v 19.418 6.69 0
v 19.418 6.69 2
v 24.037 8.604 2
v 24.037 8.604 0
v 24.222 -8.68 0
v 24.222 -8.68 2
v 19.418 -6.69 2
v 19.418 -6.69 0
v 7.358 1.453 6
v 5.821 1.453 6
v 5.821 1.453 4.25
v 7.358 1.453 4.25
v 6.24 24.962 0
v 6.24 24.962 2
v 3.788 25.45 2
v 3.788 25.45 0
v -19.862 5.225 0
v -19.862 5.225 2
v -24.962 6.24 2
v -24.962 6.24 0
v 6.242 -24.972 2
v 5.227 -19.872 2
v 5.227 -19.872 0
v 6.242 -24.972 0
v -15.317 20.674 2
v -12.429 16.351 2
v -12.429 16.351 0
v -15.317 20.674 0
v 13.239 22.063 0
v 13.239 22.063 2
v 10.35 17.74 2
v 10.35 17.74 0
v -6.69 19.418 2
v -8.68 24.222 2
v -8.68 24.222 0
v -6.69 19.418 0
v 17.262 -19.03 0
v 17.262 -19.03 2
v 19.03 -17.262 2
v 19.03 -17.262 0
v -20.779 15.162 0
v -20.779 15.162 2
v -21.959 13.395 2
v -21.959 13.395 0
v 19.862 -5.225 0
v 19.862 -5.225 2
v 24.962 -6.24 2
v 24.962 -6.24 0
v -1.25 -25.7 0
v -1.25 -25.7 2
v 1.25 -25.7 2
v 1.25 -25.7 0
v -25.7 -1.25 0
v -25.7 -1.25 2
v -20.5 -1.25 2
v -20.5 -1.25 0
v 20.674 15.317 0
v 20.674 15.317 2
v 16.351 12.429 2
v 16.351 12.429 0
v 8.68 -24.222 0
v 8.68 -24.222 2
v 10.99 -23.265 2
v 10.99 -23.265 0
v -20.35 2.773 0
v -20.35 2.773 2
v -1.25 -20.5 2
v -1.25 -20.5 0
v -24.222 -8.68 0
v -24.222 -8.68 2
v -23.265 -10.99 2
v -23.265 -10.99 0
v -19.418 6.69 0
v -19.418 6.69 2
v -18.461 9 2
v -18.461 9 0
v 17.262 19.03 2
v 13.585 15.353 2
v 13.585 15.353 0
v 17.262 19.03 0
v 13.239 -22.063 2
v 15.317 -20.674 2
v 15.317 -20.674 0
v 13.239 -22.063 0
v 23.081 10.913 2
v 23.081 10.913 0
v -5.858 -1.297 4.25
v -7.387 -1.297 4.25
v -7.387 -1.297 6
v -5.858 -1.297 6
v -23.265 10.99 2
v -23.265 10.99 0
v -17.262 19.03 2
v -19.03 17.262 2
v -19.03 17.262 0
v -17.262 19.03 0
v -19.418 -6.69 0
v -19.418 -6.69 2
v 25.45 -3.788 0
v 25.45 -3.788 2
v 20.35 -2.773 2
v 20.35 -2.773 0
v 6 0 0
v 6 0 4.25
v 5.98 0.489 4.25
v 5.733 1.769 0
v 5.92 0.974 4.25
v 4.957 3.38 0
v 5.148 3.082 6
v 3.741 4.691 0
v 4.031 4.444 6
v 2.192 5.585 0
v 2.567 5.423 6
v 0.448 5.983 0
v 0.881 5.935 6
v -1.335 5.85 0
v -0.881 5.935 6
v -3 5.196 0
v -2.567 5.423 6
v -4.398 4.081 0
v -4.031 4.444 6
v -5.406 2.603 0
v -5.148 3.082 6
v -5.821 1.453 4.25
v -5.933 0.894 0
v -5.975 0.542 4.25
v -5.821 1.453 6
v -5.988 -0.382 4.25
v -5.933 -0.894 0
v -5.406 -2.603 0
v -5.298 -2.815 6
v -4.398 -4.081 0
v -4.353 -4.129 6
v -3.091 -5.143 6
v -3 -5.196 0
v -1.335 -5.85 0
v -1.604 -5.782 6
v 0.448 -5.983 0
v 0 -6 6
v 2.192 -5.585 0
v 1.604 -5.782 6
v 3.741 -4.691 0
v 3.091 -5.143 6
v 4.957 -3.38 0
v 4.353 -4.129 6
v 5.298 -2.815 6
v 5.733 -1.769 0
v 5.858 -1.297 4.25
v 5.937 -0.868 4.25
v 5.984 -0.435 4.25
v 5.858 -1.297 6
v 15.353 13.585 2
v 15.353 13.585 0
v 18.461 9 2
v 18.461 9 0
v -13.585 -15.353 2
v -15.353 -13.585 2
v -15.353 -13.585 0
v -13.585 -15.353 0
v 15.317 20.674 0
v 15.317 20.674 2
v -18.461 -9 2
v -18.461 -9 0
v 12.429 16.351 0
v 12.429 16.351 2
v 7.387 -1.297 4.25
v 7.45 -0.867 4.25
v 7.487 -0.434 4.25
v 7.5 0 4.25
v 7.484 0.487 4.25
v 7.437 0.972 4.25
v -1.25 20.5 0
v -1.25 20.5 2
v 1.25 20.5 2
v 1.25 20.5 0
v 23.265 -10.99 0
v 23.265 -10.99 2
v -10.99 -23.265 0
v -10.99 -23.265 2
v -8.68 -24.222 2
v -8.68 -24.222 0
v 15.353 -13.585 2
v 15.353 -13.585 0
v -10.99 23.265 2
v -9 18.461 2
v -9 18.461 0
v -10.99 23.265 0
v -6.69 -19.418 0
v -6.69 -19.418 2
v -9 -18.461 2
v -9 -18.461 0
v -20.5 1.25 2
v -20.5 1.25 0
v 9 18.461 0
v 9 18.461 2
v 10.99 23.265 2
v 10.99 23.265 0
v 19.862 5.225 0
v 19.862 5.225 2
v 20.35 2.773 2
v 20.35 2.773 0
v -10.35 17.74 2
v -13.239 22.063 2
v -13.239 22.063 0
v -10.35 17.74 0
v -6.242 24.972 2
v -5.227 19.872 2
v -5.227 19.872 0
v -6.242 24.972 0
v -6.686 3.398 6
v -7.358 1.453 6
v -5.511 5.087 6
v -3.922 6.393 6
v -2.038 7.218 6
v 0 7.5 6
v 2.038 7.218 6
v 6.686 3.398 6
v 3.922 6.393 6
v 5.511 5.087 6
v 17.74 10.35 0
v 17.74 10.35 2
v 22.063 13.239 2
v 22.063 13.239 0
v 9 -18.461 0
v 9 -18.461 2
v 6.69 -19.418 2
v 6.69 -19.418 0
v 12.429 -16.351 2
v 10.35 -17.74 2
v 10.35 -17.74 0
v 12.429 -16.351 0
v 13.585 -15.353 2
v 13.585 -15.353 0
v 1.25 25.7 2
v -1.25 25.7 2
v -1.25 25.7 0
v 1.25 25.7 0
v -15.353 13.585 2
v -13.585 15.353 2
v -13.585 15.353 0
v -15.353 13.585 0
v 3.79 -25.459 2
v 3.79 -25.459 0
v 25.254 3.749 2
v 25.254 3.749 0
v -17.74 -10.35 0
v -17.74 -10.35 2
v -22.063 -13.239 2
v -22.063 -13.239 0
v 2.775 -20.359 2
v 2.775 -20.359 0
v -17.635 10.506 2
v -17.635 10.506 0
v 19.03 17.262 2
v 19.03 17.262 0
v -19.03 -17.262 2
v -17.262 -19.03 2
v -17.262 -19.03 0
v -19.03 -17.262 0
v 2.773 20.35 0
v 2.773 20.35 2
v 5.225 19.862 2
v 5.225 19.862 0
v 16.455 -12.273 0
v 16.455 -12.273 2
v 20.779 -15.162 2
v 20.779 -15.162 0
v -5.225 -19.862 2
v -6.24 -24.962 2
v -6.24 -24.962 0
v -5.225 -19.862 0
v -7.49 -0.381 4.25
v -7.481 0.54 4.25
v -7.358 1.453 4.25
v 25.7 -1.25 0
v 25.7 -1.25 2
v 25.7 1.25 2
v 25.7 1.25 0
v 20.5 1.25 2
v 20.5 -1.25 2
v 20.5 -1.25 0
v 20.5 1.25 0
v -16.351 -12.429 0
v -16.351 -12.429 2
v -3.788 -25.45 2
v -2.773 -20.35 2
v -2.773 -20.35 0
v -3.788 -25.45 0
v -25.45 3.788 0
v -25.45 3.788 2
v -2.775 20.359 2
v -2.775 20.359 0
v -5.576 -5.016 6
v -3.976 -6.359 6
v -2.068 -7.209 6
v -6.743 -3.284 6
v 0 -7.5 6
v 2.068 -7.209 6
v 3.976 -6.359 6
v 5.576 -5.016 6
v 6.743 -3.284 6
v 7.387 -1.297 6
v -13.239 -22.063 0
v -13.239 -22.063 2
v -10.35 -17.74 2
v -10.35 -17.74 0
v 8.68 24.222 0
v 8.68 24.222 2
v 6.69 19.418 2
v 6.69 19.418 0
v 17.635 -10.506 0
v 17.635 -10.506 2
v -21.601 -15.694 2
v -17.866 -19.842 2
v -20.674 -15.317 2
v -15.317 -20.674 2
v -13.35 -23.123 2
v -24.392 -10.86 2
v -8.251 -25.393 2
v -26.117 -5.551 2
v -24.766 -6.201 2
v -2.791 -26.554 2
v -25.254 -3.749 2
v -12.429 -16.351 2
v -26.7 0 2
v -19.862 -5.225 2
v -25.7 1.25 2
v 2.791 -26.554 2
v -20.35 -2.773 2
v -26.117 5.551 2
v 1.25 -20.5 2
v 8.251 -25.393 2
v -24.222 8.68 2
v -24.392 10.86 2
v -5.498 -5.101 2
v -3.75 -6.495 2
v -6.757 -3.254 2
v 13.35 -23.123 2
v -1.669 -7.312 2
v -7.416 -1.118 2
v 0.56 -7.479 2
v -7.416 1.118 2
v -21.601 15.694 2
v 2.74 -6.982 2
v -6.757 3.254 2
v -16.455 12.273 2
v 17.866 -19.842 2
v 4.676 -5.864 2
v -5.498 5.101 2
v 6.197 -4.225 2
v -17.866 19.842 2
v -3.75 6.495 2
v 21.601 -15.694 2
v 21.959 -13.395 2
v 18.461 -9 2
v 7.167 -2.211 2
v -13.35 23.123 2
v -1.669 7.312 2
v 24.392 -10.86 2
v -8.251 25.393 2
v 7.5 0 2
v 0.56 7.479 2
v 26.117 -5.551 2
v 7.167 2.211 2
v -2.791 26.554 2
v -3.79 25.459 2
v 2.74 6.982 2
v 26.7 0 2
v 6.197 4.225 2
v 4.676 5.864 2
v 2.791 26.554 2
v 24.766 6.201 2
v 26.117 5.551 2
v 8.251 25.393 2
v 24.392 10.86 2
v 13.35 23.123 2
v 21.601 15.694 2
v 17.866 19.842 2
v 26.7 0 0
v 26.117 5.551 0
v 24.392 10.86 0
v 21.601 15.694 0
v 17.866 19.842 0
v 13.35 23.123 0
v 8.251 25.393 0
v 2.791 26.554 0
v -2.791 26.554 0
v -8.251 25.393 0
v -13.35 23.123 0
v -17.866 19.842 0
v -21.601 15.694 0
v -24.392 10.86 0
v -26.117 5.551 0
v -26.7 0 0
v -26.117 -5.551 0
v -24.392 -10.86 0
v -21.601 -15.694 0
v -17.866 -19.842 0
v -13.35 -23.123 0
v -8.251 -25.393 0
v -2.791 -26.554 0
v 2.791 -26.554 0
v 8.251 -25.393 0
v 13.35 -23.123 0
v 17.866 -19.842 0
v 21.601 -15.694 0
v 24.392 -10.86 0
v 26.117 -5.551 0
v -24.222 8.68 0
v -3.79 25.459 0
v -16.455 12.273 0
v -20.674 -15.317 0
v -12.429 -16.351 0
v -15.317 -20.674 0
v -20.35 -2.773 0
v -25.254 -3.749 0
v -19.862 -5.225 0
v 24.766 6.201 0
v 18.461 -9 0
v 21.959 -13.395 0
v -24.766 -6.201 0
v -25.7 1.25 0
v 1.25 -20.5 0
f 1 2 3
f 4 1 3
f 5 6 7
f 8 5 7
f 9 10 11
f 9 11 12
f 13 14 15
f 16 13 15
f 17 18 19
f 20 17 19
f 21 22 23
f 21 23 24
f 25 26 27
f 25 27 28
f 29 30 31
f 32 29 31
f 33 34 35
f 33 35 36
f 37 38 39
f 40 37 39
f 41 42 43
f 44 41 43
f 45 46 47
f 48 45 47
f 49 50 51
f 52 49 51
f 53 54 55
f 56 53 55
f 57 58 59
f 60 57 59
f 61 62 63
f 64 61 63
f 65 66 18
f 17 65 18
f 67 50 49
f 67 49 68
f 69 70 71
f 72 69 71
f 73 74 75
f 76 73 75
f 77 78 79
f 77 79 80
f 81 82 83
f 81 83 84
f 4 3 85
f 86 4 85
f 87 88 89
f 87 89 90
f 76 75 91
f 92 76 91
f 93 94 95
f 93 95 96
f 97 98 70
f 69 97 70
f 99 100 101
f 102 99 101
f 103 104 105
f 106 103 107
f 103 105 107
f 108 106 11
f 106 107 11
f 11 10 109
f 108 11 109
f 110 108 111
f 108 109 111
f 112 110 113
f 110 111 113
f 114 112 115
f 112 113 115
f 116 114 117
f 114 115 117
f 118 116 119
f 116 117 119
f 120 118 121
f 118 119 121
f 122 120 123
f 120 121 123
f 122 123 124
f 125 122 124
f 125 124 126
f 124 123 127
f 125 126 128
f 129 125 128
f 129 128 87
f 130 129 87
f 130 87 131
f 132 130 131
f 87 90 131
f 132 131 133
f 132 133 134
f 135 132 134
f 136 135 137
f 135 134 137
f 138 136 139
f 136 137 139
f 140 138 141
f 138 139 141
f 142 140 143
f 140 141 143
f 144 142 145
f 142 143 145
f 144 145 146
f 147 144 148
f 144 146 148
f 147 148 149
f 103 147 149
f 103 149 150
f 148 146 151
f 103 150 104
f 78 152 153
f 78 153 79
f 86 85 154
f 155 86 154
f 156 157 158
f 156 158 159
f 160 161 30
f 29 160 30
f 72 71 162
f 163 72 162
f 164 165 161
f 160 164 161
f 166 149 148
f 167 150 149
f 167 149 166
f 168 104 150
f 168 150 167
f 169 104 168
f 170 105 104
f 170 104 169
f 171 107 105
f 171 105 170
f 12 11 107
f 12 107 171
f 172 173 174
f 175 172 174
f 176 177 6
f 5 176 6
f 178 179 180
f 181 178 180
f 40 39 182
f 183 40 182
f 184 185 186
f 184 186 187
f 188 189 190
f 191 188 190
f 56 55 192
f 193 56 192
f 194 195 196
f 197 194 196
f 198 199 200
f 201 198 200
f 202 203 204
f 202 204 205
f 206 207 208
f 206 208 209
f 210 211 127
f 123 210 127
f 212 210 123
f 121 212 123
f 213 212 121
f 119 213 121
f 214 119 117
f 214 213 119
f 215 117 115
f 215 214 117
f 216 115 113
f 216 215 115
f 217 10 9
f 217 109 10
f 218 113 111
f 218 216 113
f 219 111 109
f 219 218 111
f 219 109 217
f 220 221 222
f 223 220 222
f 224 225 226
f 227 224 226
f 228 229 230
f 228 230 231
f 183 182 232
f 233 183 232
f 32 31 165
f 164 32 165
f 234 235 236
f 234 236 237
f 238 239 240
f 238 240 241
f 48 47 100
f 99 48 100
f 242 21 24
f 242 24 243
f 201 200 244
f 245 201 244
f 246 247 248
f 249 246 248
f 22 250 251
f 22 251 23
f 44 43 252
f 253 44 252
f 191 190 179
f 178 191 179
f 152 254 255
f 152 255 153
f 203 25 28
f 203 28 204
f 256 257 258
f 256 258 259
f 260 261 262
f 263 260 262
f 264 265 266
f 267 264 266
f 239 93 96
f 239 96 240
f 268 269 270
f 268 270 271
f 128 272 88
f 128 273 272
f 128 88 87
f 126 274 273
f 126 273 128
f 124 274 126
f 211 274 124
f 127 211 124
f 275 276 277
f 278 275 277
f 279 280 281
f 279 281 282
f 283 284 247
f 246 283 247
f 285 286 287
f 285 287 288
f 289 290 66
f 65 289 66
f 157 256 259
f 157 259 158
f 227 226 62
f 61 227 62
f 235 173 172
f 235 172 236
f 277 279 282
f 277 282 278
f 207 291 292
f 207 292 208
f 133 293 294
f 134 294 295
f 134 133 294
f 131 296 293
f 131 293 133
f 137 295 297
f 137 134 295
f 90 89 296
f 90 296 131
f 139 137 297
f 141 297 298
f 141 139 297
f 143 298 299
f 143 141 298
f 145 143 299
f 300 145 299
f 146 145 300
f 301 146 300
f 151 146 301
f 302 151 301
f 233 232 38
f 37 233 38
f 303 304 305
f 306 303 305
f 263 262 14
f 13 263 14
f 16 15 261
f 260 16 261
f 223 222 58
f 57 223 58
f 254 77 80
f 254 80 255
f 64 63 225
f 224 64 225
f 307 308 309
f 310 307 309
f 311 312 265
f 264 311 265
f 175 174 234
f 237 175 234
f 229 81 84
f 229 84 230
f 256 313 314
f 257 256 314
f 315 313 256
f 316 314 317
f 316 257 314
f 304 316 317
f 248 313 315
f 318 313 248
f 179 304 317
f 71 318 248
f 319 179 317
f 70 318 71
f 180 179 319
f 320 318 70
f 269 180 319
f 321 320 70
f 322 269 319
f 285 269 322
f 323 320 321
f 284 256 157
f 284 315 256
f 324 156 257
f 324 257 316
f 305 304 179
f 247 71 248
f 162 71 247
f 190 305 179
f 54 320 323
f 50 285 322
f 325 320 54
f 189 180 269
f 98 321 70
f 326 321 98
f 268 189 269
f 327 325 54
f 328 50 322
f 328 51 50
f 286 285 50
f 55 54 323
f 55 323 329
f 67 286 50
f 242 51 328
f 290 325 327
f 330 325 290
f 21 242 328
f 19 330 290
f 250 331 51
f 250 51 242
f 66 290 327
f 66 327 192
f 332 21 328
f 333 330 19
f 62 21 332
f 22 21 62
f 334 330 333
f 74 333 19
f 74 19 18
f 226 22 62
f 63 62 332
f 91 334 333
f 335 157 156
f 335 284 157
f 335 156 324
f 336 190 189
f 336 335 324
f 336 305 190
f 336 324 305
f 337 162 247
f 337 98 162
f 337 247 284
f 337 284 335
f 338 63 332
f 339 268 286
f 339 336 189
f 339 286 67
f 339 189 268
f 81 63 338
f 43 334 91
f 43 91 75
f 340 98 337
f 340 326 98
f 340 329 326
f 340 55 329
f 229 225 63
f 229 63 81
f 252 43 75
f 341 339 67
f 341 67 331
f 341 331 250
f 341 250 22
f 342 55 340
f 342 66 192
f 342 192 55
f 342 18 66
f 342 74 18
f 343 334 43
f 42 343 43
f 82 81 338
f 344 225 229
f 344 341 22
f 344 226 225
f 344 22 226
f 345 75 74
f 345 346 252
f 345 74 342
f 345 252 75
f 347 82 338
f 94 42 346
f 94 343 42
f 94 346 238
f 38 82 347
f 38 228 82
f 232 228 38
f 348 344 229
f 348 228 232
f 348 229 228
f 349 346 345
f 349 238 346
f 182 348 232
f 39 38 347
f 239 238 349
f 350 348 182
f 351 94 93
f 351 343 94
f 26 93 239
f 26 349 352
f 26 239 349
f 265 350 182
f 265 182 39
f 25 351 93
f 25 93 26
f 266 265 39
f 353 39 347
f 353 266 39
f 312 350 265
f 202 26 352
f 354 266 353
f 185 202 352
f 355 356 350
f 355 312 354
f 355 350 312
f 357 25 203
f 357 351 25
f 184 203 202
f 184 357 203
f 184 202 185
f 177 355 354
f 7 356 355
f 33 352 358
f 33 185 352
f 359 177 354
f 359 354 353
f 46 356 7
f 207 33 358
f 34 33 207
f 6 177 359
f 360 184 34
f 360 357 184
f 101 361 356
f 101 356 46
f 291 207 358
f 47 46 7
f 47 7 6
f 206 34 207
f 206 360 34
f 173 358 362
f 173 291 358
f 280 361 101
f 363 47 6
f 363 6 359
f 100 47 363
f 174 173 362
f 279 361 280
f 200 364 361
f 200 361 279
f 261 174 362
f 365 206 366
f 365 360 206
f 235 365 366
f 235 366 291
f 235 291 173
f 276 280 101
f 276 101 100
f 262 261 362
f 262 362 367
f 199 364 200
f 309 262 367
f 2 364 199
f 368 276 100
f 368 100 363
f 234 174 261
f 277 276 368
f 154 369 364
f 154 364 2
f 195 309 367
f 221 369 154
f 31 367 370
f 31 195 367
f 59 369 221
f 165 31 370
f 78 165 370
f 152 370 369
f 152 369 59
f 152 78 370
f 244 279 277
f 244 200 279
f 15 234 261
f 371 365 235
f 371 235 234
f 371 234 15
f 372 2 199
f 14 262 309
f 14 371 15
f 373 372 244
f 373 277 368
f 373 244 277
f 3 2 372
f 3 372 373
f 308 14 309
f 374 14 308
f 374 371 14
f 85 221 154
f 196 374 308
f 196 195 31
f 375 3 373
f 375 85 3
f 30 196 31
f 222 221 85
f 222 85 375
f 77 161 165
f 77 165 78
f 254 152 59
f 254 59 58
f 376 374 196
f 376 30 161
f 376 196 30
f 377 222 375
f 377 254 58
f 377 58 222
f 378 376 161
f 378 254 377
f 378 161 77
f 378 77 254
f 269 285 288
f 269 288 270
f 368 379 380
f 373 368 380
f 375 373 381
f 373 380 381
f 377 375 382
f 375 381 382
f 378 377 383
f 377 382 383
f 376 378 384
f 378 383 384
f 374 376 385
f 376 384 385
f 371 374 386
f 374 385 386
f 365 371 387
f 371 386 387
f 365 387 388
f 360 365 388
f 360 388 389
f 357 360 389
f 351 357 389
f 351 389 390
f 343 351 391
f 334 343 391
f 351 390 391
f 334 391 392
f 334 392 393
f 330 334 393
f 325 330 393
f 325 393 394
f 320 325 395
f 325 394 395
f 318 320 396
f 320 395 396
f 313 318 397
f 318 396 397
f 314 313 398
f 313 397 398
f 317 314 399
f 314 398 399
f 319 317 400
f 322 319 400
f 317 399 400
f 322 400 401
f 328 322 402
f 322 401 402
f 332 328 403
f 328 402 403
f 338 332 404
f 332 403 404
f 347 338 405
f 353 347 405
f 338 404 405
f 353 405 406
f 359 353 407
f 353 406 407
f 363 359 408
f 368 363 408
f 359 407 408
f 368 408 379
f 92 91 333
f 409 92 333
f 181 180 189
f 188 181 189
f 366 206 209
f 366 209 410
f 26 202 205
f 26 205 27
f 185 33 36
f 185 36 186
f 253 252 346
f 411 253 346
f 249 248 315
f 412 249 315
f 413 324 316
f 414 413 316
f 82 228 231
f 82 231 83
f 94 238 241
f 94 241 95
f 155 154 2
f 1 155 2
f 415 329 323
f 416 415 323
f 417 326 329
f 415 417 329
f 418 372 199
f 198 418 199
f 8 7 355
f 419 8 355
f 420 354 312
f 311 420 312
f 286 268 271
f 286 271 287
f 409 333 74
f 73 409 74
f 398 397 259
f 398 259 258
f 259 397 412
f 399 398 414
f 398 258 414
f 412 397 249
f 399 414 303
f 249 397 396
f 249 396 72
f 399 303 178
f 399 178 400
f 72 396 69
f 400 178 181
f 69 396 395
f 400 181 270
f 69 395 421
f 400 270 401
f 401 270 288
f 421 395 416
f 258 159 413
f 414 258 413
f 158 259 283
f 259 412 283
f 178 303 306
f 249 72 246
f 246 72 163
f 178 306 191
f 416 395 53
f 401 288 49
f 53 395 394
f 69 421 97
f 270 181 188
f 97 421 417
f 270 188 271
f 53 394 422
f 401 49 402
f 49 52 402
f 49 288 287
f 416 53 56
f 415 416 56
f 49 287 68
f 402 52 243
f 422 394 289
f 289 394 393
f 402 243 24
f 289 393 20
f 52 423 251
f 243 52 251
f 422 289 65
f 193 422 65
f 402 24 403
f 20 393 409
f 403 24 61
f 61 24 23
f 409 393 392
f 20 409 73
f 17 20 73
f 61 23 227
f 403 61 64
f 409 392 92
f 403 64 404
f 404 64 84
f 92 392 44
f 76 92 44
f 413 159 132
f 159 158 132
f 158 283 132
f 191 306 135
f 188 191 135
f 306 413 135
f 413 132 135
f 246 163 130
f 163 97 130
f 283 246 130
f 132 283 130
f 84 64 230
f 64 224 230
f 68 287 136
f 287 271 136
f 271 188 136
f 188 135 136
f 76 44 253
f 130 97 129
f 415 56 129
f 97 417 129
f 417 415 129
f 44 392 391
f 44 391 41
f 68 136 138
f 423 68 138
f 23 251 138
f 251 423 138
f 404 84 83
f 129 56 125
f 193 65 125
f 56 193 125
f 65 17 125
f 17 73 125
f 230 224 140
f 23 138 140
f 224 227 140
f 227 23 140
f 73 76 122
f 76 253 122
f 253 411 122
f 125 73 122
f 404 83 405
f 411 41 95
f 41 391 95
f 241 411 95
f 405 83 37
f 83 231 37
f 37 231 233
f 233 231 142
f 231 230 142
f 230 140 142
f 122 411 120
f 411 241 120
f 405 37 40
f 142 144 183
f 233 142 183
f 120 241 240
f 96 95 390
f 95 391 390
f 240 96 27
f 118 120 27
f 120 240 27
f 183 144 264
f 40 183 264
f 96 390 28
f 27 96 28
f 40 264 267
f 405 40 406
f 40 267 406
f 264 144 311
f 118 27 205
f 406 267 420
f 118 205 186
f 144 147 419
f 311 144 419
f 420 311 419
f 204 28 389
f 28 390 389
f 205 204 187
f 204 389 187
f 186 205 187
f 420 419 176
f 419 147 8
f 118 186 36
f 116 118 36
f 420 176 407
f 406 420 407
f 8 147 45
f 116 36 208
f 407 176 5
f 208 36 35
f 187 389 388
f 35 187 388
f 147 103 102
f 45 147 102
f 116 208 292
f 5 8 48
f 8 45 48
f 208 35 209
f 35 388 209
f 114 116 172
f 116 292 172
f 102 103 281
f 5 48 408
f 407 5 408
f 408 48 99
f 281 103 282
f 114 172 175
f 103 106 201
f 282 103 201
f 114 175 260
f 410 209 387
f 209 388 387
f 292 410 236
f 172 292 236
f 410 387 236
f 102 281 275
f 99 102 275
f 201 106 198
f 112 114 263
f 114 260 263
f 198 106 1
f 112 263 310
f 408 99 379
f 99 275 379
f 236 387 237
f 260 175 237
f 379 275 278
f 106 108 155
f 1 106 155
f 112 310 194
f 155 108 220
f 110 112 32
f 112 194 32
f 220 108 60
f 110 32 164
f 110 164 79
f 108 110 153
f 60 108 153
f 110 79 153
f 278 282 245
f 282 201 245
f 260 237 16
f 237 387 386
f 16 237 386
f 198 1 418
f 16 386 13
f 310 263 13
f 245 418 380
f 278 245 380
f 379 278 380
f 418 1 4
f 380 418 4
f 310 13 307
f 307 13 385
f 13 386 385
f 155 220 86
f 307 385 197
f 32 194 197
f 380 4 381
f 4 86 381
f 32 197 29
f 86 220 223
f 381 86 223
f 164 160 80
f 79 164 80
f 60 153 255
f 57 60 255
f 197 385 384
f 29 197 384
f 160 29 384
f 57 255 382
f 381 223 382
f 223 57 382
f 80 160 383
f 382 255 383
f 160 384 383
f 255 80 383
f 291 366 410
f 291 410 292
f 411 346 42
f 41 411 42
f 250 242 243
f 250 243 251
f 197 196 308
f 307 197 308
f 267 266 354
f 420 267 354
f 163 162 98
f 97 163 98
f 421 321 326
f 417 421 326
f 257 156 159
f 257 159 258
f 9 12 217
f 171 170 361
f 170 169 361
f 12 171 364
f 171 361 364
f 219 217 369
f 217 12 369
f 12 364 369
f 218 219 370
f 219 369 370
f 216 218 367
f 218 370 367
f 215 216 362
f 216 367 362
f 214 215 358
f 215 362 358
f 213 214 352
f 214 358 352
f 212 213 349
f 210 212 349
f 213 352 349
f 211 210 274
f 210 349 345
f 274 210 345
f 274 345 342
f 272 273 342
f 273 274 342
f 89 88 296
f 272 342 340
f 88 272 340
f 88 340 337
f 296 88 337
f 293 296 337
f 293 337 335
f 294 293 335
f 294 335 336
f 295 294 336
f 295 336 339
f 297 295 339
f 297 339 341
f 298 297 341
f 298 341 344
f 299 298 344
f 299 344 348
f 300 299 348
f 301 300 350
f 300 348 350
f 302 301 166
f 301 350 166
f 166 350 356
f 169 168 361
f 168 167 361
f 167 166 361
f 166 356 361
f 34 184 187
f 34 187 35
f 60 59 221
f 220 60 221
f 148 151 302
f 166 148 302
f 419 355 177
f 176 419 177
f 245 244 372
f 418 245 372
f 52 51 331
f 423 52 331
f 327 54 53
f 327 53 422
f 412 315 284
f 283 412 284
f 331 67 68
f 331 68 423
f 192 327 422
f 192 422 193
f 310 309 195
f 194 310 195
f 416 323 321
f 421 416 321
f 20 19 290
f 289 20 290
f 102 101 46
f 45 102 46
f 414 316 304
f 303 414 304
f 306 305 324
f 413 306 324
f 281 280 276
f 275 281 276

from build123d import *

# Parameters (mm, degrees)
SKETCH_R        = 26.7
PAD_DEPTH       = 2
SKETCH001_W     = 5.2
SKETCH001_H     = 2.5
SKETCH001_W_2   = 2.5
SKETCH001_H_2   = 5.2
POCKET_DEPTH    = 2.001
SKETCH002_R     = 7.5
PAD001_DEPTH    = 4
SKETCH003_R     = 6
POCKET001_DEPTH = 6.001
SKETCH004_W     = 18.225545
SKETCH004_H     = 2.75
POCKET002_DEPTH = 1.75


with BuildPart() as part:
    # Sketch → Pad (new body)
    with BuildSketch(Plane.XY):
        Circle(SKETCH_R)
    extrude(amount=PAD_DEPTH)

    # Sketch001 → Pocket (cut, through all)
    with BuildSketch(Plane.XY.offset(2)):
        with Locations((-23.1, 0)):
            Rectangle(SKETCH001_W, SKETCH001_H)
        with Locations((23.1, 0)):
            Rectangle(SKETCH001_W, SKETCH001_H)
        with Locations((0, 23.1)):
            Rectangle(SKETCH001_W_2, SKETCH001_H_2)
        with Locations((0, -23.1)):
            Rectangle(SKETCH001_W_2, SKETCH001_H_2)
        Polygon((-19.029555, 17.261788), (-17.261788, 19.029555), (-13.584833, 15.3526), (-15.3526, 13.584833), align=None)
        Polygon((17.261788, 19.029555), (19.029555, 17.261788), (15.3526, 13.584833), (13.584833, 15.3526), align=None)
        Polygon((17.261788, -19.029555), (19.029555, -17.261788), (15.3526, -13.584833), (13.584833, -15.3526), align=None)
        Polygon((-17.261788, -19.029555), (-19.029555, -17.261788), (-15.3526, -13.584833), (-13.584833, -15.3526), align=None)
        Polygon((8.680115, 24.222058), (6.690161, 19.417885), (8.99986, 18.461176), (10.989814, 23.26535), align=None)
        Polygon((18.461176, 8.99986), (19.417885, 6.690161), (24.037282, 8.603578), (23.080574, 10.913277), align=None)
        Polygon((-23.26535, 10.989814), (-24.222058, 8.680115), (-19.417885, 6.690161), (-18.461176, 8.99986), align=None)
        Polygon((-24.222058, -8.680115), (-23.26535, -10.989814), (-18.461176, -8.99986), (-19.417885, -6.690161), align=None)
        Polygon((-10.989814, -23.26535), (-8.680115, -24.222058), (-6.690161, -19.417885), (-8.99986, -18.461176), align=None)
        Polygon((6.690161, -19.417885), (8.680115, -24.222058), (10.989814, -23.26535), (8.99986, -18.461176), align=None)
        Polygon((19.417885, -6.690161), (18.461176, -8.99986), (23.26535, -10.989814), (24.222058, -8.680115), align=None)
        Polygon((-10.989814, 23.26535), (-8.680115, 24.222058), (-6.690161, 19.417885), (-8.99986, 18.461176), align=None)
        Polygon((19.862235, 5.225333), (20.349961, 2.77337), (25.253888, 3.748822), (24.766162, 6.200785), align=None)
        Polygon((-25.253888, -3.748822), (-24.766162, -6.200785), (-19.862235, -5.225333), (-20.349961, -2.77337), align=None)
        Polygon((-24.962319, 6.239803), (-25.450045, 3.78784), (-20.349961, 2.77337), (-19.862235, 5.225333), align=None)
        Polygon((-20.778522, 15.161523), (-21.959016, 13.394787), (-17.635375, 10.505822), (-16.45488, 12.272558), align=None)
        Polygon((-15.317492, 20.674306), (-13.238818, 22.063232), (-10.349853, 17.73959), (-12.428527, 16.350664), align=None)
        Polygon((-6.241651, 24.971611), (-3.789688, 25.459337), (-2.775218, 20.359254), (-5.227182, 19.871528), align=None)
        Polygon((3.78784, 25.450045), (2.77337, 20.349961), (5.225333, 19.862235), (6.239803, 24.962319), align=None)
        Polygon((13.238818, 22.063232), (10.349853, 17.73959), (12.428527, 16.350664), (15.317492, 20.674306), align=None)
        Polygon((16.350664, 12.428527), (17.73959, 10.349853), (22.063232, 13.238818), (20.674306, 15.317492), align=None)
        Polygon((20.349961, -2.77337), (19.862235, -5.225333), (24.962319, -6.239803), (25.450045, -3.78784), align=None)
        Polygon((17.635375, -10.505822), (16.45488, -12.272558), (20.778522, -15.161523), (21.959016, -13.394787), align=None)
        Polygon((10.349853, -17.73959), (12.428527, -16.350664), (15.317492, -20.674306), (13.238818, -22.063232), align=None)
        Polygon((2.775218, -20.359254), (5.227182, -19.871528), (6.241651, -24.971611), (3.789688, -25.459337), align=None)
        Polygon((-2.77337, -20.349961), (-3.78784, -25.450045), (-6.239803, -24.962319), (-5.225333, -19.862235), align=None)
        Polygon((-15.317492, -20.674306), (-13.238818, -22.063232), (-10.349853, -17.73959), (-12.428527, -16.350664), align=None)
        Polygon((-22.063232, -13.238818), (-20.674306, -15.317492), (-16.350664, -12.428527), (-17.73959, -10.349853), align=None)
    extrude(amount=-POCKET_DEPTH, mode=Mode.SUBTRACT)

    # Sketch002 → Pad001 (new body)
    with BuildSketch(Plane.XY.offset(2)):
        Circle(SKETCH002_R)
    extrude(amount=PAD001_DEPTH)

    # Sketch003 → Pocket001 (cut, through all)
    with BuildSketch(Plane.XY.offset(6)):
        Circle(SKETCH003_R)
    extrude(amount=-POCKET001_DEPTH, mode=Mode.SUBTRACT)

    # Sketch004 → Pocket002 (cut)
    with BuildSketch(Plane.XY.offset(6)):
        with Locations((0.188303, 0.078437)):
            Rectangle(SKETCH004_W, SKETCH004_H)
    extrude(amount=-POCKET002_DEPTH, mode=Mode.SUBTRACT)


solid = part.part
